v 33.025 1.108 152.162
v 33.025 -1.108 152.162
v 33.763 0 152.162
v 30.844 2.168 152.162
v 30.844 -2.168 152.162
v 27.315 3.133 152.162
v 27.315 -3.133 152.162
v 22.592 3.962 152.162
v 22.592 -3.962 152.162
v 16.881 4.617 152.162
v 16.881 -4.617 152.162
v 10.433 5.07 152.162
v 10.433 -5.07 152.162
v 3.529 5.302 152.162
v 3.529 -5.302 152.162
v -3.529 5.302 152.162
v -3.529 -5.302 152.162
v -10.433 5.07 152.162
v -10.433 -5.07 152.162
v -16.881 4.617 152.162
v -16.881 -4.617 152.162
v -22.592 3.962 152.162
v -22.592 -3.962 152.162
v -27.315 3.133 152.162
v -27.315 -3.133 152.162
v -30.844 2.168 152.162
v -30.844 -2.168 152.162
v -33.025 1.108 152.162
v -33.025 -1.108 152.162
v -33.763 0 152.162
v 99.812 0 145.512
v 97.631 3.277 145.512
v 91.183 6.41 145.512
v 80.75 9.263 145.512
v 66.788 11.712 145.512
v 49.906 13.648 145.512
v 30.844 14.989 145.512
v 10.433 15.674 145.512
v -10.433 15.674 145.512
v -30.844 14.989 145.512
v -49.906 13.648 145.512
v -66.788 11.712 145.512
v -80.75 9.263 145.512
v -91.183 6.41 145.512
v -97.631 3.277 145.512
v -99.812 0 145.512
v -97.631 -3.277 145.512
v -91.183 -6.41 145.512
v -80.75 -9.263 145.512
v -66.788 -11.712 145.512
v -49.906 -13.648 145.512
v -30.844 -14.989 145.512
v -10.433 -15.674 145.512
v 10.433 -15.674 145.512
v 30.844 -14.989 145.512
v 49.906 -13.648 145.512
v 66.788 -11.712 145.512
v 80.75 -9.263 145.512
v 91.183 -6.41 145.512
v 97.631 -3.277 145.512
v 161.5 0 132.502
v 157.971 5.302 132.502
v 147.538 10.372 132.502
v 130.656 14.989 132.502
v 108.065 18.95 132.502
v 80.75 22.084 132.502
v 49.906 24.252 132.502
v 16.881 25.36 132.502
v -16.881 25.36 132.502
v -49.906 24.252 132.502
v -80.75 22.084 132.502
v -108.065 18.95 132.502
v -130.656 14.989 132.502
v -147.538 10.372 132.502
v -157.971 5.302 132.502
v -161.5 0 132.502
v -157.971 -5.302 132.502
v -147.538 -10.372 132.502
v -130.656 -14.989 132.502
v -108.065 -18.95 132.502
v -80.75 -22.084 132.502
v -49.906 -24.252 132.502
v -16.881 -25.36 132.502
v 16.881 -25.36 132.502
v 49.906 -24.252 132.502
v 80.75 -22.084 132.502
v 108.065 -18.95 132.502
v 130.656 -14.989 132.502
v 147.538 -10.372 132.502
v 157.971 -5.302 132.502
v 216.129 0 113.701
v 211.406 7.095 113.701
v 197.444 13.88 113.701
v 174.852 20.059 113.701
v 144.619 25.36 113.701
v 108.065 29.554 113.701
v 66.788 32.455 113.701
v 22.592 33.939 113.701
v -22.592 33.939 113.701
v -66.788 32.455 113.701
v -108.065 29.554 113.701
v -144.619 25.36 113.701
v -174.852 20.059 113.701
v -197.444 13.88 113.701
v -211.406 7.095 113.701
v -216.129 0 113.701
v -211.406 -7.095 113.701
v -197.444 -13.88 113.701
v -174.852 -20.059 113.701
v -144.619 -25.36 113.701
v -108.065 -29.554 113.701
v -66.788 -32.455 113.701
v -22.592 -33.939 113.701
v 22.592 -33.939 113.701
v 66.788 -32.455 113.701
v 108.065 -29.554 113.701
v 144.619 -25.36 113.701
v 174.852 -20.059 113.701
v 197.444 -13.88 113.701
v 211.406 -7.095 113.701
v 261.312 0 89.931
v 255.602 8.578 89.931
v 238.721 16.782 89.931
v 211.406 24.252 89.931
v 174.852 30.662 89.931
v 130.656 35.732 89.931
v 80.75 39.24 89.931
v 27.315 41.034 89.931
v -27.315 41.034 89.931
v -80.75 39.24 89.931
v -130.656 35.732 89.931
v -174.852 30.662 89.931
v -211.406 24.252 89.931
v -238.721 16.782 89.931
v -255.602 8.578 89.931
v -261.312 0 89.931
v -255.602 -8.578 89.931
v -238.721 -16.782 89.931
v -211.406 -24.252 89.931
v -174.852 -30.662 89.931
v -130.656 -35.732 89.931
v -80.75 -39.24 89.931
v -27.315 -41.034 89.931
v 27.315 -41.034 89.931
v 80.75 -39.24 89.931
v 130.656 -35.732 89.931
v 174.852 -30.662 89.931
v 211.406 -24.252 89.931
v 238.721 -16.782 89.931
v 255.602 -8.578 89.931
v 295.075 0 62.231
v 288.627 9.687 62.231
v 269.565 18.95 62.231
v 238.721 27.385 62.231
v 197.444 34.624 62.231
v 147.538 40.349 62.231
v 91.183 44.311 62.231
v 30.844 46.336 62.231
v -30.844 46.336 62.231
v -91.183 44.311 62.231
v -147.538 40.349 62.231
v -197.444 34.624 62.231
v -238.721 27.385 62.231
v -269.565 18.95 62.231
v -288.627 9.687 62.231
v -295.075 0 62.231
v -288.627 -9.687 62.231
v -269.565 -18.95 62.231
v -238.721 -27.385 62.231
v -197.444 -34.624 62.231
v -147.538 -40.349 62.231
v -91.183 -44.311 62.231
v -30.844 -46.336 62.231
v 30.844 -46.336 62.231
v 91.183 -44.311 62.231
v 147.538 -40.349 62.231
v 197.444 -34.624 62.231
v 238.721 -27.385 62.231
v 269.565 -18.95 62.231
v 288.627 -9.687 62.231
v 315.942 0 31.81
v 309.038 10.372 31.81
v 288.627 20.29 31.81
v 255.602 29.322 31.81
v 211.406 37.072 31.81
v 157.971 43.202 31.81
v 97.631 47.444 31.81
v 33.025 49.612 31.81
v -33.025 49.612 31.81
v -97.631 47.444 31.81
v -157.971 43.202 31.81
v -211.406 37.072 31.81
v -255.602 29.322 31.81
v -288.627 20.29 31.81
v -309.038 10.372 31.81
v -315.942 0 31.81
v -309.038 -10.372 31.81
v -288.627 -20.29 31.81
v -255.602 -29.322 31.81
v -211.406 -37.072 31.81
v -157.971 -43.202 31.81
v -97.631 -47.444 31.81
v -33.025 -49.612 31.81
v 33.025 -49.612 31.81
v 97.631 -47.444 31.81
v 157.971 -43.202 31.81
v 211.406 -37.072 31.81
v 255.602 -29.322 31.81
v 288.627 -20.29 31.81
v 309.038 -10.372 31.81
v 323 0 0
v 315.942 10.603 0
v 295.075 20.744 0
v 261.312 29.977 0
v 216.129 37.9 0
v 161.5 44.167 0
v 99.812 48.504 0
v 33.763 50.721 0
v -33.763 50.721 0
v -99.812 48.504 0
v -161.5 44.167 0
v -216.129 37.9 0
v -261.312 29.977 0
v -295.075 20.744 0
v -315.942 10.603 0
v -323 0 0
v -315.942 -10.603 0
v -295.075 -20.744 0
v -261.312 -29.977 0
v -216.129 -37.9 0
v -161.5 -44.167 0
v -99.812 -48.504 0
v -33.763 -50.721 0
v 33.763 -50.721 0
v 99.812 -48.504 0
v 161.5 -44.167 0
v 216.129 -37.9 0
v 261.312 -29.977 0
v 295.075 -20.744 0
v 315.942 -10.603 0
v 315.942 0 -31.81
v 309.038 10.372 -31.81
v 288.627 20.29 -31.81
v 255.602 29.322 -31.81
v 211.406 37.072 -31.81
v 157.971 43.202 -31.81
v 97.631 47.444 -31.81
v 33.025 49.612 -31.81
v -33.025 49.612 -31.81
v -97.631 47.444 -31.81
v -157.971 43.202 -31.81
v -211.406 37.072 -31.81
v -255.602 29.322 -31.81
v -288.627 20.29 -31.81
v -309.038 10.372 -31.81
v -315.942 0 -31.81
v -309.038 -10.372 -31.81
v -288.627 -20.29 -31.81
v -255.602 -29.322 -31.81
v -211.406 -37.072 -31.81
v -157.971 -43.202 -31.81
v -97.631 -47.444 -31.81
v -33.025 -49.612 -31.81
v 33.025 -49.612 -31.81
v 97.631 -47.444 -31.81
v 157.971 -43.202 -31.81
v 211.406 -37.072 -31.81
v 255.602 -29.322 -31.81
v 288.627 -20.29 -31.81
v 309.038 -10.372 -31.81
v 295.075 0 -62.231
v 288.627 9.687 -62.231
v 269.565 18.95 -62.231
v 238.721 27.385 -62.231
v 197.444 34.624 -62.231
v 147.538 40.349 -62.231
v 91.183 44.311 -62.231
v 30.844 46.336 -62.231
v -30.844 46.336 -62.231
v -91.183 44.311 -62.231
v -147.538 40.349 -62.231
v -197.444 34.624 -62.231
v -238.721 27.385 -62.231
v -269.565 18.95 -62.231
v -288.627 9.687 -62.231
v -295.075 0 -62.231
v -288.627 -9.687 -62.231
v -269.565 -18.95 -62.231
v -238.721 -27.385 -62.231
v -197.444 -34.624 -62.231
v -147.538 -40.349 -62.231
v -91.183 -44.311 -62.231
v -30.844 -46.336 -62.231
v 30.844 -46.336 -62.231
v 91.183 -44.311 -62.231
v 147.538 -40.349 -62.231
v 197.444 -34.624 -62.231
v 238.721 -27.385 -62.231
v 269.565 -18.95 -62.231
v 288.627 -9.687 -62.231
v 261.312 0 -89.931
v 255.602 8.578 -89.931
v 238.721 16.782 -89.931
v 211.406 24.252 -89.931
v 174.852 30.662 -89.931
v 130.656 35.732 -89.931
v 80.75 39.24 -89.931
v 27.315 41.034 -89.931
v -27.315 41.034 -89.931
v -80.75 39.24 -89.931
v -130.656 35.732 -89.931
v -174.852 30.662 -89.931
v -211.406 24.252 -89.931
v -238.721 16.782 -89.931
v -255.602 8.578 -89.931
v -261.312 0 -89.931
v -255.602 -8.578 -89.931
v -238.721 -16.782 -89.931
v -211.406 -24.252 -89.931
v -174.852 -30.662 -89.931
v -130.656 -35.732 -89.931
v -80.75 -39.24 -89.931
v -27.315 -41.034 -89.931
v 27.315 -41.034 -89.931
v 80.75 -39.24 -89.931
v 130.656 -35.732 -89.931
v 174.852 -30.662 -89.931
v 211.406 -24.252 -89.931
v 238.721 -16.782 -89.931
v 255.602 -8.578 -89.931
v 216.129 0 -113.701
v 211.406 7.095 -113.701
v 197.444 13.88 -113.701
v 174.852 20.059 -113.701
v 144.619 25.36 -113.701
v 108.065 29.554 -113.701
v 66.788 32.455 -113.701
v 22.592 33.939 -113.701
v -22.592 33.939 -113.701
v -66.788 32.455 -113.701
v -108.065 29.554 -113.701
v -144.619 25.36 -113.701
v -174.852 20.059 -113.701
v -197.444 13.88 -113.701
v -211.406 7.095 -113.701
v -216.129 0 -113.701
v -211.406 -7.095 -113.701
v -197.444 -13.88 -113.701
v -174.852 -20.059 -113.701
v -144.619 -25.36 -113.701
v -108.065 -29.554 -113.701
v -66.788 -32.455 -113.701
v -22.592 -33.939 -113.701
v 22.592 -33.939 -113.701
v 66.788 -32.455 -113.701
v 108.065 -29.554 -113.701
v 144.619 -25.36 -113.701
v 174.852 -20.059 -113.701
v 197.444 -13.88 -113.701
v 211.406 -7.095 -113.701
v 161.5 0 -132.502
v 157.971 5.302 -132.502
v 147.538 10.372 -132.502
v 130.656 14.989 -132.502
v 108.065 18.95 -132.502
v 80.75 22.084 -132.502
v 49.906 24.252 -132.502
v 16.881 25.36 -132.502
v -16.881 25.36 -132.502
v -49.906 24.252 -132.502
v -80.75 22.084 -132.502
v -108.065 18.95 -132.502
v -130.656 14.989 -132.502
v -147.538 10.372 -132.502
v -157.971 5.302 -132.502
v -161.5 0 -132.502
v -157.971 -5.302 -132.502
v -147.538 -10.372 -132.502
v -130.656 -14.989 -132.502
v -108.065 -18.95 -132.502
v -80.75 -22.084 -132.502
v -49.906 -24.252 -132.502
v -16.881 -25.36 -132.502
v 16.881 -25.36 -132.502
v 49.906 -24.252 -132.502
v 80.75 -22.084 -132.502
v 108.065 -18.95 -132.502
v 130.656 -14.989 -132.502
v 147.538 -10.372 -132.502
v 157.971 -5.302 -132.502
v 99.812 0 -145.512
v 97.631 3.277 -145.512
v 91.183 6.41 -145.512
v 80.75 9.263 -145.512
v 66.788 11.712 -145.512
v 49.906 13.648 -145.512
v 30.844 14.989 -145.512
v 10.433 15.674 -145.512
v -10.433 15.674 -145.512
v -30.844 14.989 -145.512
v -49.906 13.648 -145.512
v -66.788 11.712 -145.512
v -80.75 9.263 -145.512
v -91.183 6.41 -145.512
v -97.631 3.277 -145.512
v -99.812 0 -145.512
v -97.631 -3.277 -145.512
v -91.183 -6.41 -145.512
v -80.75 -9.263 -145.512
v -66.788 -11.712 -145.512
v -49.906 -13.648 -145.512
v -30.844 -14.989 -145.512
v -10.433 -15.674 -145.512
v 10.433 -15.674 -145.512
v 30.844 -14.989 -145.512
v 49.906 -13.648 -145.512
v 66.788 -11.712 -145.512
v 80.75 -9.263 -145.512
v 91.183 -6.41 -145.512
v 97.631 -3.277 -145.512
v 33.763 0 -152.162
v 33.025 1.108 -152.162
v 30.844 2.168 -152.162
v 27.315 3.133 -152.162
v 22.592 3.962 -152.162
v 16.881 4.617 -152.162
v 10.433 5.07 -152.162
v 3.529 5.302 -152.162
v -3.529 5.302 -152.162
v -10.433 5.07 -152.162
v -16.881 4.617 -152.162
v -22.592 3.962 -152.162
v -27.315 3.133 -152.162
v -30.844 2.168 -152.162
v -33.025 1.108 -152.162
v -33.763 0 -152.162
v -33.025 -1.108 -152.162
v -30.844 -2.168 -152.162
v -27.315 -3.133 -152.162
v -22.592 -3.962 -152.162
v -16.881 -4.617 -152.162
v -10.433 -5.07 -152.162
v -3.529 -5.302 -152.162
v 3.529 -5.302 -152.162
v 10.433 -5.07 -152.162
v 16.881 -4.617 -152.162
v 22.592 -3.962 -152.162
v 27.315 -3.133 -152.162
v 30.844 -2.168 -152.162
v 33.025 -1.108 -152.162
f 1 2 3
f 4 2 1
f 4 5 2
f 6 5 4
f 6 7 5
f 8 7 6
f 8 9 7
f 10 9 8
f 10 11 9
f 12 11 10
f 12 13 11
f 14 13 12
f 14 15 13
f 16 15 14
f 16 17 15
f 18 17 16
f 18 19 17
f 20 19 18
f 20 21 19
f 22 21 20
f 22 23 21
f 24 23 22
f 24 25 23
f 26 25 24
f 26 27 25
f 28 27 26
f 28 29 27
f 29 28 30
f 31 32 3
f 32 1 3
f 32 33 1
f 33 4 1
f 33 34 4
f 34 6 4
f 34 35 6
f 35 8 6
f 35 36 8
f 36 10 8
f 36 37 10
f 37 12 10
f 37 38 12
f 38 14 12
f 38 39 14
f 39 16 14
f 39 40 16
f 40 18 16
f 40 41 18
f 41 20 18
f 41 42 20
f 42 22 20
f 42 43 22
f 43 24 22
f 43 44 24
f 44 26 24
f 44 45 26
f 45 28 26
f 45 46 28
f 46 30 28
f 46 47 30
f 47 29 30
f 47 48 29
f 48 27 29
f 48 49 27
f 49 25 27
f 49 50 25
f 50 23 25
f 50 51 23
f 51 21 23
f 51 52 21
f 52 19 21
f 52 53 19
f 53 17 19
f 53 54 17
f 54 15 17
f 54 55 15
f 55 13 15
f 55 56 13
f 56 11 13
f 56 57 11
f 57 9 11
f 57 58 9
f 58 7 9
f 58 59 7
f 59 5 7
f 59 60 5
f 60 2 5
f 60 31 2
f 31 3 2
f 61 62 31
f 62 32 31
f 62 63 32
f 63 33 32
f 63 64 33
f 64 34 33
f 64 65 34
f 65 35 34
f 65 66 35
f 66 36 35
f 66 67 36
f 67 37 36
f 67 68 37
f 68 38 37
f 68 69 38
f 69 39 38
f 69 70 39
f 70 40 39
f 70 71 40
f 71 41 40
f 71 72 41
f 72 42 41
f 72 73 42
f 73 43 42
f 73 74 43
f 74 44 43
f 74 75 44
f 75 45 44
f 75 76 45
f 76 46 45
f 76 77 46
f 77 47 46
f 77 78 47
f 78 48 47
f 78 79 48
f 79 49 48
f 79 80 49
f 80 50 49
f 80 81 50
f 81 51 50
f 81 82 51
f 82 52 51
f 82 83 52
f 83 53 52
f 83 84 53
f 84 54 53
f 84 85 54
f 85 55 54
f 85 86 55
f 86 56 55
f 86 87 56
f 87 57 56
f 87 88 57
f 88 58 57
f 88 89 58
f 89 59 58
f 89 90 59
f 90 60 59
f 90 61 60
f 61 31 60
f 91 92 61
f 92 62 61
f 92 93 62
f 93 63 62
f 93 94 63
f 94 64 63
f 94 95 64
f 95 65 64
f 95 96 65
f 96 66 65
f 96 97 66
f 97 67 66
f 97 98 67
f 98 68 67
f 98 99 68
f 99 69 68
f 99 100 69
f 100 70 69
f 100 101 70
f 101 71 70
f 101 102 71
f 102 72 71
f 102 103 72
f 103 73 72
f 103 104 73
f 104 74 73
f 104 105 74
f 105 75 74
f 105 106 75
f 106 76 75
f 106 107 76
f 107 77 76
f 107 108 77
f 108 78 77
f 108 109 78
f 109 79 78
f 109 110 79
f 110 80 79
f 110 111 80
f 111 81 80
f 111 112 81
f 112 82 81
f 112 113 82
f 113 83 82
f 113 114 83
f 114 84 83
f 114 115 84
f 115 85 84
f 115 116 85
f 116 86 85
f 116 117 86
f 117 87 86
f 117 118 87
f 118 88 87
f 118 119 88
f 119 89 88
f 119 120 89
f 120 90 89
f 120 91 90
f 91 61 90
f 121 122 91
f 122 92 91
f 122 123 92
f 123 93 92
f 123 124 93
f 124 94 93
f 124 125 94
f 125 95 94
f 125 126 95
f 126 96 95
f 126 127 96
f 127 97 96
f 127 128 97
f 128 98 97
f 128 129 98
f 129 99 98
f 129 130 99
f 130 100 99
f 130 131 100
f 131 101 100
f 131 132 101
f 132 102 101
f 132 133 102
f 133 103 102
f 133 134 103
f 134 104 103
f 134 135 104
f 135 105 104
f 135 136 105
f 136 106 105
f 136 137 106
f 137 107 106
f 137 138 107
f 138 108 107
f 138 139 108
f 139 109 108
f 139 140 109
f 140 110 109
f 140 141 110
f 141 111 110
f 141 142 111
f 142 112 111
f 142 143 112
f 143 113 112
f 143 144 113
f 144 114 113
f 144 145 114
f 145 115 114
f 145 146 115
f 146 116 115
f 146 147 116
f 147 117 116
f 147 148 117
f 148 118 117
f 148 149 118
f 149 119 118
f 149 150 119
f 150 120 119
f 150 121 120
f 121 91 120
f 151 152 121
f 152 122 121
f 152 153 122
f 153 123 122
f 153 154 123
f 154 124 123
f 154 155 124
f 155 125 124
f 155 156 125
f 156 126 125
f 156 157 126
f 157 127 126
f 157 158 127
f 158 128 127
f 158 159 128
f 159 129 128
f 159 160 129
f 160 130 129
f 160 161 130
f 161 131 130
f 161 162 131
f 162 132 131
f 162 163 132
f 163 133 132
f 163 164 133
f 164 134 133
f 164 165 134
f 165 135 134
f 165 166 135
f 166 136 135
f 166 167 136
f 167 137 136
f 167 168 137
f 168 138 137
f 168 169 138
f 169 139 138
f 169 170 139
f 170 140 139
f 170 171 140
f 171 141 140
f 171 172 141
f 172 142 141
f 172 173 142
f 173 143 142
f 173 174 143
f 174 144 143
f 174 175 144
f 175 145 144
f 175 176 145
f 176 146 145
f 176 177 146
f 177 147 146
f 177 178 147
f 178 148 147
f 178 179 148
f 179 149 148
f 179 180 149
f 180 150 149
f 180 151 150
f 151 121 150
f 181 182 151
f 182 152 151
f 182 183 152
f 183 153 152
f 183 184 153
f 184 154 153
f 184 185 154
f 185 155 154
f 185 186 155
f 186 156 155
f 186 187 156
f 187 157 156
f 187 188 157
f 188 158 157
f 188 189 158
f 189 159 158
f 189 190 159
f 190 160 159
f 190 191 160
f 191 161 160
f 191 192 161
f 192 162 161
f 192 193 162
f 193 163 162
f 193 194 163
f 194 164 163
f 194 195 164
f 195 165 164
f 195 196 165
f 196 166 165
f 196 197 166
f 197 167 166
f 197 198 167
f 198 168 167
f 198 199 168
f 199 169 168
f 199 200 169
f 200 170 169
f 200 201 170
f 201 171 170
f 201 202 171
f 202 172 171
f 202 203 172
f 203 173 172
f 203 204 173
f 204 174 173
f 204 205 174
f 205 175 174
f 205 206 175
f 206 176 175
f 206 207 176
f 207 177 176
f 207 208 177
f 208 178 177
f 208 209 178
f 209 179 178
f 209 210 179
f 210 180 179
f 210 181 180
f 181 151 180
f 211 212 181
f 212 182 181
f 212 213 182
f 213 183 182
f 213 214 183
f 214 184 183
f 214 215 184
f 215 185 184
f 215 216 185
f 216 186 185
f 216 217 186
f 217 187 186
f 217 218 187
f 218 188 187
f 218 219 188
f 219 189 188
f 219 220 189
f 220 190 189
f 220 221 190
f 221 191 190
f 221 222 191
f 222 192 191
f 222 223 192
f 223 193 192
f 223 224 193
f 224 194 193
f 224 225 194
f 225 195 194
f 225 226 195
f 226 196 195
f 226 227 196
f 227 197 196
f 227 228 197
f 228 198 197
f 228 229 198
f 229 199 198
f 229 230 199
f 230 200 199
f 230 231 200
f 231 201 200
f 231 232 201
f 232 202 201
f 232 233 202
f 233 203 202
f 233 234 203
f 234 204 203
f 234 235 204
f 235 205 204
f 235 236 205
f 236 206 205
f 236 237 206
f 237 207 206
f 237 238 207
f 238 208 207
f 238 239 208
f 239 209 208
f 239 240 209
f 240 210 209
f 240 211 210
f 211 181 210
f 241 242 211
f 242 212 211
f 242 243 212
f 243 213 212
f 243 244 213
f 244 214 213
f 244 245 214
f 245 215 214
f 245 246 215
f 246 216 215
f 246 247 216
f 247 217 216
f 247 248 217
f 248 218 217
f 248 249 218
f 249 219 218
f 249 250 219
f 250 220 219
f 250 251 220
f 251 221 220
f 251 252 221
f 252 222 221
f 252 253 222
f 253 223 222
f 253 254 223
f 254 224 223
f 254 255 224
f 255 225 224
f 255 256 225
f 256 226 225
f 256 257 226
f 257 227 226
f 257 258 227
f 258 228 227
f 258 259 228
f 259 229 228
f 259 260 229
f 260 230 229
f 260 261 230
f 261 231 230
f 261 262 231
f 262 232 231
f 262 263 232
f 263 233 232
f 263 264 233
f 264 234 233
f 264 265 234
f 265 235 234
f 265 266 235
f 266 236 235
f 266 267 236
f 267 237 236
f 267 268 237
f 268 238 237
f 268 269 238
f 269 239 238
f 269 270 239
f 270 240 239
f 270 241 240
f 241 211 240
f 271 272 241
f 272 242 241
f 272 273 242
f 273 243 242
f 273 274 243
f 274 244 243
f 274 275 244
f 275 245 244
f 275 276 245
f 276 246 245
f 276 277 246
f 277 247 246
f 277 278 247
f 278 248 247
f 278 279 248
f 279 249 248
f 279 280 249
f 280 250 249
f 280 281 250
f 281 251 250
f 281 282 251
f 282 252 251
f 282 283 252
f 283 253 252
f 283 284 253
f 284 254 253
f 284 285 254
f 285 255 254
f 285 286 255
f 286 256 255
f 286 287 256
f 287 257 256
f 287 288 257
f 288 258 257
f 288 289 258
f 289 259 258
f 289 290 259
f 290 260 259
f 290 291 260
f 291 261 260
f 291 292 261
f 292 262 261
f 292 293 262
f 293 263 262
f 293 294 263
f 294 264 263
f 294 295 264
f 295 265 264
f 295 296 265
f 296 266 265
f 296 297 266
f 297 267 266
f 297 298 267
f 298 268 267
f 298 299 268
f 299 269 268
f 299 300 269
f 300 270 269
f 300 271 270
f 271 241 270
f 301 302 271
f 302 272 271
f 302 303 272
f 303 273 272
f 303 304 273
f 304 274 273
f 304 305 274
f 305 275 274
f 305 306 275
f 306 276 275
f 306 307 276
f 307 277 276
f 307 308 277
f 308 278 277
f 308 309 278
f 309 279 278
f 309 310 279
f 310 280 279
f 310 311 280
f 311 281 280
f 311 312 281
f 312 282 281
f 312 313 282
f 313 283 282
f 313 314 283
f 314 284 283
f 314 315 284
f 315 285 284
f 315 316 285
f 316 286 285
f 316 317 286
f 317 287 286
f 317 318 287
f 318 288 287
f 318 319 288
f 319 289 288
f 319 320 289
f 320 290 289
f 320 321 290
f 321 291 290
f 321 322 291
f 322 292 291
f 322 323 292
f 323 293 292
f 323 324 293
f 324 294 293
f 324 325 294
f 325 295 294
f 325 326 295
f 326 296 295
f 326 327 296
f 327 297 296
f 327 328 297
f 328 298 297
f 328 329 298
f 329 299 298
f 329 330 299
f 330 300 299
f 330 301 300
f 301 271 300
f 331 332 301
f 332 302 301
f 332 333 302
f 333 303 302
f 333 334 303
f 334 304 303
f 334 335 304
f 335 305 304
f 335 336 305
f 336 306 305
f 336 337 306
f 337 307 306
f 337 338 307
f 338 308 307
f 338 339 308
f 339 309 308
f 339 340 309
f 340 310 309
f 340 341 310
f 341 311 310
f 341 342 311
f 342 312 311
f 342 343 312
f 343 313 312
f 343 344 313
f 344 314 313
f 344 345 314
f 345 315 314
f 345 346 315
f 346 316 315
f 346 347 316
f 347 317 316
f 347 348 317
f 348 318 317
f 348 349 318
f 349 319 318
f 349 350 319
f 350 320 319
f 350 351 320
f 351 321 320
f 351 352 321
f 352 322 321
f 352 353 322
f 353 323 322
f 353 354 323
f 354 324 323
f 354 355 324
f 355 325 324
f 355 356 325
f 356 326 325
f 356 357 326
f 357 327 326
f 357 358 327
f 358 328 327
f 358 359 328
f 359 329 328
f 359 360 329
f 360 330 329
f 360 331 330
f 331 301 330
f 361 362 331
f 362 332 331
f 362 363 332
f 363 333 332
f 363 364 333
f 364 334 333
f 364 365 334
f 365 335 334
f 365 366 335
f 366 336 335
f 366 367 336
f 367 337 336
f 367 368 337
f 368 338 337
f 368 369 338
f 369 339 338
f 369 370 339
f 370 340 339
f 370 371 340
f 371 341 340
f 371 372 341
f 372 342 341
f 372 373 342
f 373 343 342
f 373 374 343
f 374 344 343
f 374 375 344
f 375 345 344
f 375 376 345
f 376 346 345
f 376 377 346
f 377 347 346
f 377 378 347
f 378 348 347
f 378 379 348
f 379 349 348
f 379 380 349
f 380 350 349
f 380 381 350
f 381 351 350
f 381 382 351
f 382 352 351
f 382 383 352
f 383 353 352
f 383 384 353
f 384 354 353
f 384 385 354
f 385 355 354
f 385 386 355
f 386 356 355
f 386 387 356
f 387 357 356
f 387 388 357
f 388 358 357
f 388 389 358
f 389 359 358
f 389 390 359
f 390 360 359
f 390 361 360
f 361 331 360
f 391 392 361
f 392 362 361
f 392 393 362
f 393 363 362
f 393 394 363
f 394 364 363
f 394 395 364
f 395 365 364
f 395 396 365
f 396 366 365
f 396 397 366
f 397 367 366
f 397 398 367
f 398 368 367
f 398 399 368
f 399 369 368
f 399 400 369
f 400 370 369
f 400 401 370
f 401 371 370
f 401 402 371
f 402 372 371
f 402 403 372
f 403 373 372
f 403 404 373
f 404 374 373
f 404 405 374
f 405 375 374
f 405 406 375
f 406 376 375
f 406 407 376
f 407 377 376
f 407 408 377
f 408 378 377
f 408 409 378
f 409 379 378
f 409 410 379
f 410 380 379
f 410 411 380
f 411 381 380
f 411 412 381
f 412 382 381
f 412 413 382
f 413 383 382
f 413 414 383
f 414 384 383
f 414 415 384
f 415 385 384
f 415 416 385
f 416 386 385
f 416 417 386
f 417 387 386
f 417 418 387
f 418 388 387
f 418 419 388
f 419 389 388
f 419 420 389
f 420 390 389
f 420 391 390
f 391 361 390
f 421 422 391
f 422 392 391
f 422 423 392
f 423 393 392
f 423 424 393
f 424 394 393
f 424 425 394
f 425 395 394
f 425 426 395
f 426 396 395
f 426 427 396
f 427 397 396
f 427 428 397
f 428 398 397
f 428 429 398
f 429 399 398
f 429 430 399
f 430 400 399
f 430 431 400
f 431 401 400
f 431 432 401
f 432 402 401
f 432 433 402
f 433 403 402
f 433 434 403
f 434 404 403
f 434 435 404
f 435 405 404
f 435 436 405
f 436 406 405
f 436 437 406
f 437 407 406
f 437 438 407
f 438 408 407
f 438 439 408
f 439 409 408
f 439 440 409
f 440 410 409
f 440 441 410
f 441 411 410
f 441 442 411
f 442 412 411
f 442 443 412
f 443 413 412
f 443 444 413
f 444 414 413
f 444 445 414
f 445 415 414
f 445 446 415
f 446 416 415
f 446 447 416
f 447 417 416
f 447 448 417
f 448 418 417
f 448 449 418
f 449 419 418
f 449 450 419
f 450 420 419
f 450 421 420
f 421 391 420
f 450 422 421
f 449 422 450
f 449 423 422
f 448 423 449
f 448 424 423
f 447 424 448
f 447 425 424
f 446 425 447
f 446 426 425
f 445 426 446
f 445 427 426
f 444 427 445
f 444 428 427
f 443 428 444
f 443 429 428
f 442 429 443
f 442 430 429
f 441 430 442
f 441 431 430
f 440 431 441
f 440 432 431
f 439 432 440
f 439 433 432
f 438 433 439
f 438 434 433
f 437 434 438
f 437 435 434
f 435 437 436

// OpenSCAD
// Generated by SolidPython 1.0.1 on 2020-07-29 00:46:53


scale(v = [19, 3, 9]) {
	sphere(r = 17);
}
/***********************************************
*********      SolidPython code:      **********
************************************************
 
# import packages: SolidPython
from solid import *
from solid.utils import *
from itertools import chain, combinations, permutations


class Resize:

    def __init__(self, scad_file):
        self.scad_file = scad_file
        #self.scad_file = import_scad(scad_file)
        # cone/cylinder param:
        self.r1 = 0
        self.r2 = 0
        self.h = 0
        # rectangular prism param:
        self.w = 0
        self.l = 0
        # ellipse param:
        self.r = 0

    # import OpenScad code (file name corresponds to shape)


    # classify shape + parameters
    def assign(self, param1, param2, param3):
        if self.scad_file == 'cone.scad':
            self.r1 = param1
            self.r2 = param2
            self.h = param3
        elif self.scad_file == 'cylinder.scad':
            self.r1 = param1
            self.r2 = param2
            self.h = param3
        elif self.scad_file == 'rectangularPrism.scad':
            self.h = param1
            self.l = param2
            self.w = param3
        else:
            self.r = param1
            self.h = param2

    # resize parameters
    def iterate(self):
        x = range(3, 20, 2)
        i = 1
        if self.scad_file == 'cone.scad':
            tempList = list(permutations(x, 2))
            for temp in tempList:
                param1 = temp[0]
                param2 = temp[1]
                filepath = 'produced_scad_files/' + 'cone' + str(param1) + '_' + str(param2) + '_' + '.scad'
                scad_render_to_file(cylinder(h=param1, r1=param2, r2=0), filepath)

        elif self.scad_file == 'cylinder.scad':
            tempList = list(permutations(x, 3))
            for temp in tempList:
                param1 = temp[0]
                param2 = temp[1]
                filepath = 'produced_scad_files/' + 'cylinder' + str(param1) + '_' + str(param2) + '_' + '.scad'
                scad_render_to_file(cylinder(h=param1, r1=param2, r2=param2), filepath)

        elif self.scad_file == 'rectangularPrism.scad':
            tempList = list(permutations(x, 3))
            for temp in tempList:
                param1 = temp[0]
                param2 = temp[1]
                param3 = temp[2]
                filepath = 'produced_scad_files/' + 'rectangularPrism' + str(param1) + '_' + str(param2) + '_' + str(
                    param3) + '.scad'
                scad_render_to_file(cube(size=(param1, param2, param3)), filepath)

        elif self.scad_file == 'ellipse.scad':
            tempList = list(permutations(x, 4))
            for temp in tempList:
                param1 = temp[0]
                param2 = temp[1]
                param3 = temp[2]
                param4 = temp[3]
                filepath = 'produced_scad_files/' + 'ellipse' + str(param1) + '_' + str(param2) + '_' + str(param3) + '_' + str(param4) + '.scad'
                scad_render_to_file(scale([param1, param2, param3])(sphere(r=param4)), filepath)

    def render_to_scadfile(self):
        scad_render_to_file(scad, 'example.scad') 
 
************************************************/
